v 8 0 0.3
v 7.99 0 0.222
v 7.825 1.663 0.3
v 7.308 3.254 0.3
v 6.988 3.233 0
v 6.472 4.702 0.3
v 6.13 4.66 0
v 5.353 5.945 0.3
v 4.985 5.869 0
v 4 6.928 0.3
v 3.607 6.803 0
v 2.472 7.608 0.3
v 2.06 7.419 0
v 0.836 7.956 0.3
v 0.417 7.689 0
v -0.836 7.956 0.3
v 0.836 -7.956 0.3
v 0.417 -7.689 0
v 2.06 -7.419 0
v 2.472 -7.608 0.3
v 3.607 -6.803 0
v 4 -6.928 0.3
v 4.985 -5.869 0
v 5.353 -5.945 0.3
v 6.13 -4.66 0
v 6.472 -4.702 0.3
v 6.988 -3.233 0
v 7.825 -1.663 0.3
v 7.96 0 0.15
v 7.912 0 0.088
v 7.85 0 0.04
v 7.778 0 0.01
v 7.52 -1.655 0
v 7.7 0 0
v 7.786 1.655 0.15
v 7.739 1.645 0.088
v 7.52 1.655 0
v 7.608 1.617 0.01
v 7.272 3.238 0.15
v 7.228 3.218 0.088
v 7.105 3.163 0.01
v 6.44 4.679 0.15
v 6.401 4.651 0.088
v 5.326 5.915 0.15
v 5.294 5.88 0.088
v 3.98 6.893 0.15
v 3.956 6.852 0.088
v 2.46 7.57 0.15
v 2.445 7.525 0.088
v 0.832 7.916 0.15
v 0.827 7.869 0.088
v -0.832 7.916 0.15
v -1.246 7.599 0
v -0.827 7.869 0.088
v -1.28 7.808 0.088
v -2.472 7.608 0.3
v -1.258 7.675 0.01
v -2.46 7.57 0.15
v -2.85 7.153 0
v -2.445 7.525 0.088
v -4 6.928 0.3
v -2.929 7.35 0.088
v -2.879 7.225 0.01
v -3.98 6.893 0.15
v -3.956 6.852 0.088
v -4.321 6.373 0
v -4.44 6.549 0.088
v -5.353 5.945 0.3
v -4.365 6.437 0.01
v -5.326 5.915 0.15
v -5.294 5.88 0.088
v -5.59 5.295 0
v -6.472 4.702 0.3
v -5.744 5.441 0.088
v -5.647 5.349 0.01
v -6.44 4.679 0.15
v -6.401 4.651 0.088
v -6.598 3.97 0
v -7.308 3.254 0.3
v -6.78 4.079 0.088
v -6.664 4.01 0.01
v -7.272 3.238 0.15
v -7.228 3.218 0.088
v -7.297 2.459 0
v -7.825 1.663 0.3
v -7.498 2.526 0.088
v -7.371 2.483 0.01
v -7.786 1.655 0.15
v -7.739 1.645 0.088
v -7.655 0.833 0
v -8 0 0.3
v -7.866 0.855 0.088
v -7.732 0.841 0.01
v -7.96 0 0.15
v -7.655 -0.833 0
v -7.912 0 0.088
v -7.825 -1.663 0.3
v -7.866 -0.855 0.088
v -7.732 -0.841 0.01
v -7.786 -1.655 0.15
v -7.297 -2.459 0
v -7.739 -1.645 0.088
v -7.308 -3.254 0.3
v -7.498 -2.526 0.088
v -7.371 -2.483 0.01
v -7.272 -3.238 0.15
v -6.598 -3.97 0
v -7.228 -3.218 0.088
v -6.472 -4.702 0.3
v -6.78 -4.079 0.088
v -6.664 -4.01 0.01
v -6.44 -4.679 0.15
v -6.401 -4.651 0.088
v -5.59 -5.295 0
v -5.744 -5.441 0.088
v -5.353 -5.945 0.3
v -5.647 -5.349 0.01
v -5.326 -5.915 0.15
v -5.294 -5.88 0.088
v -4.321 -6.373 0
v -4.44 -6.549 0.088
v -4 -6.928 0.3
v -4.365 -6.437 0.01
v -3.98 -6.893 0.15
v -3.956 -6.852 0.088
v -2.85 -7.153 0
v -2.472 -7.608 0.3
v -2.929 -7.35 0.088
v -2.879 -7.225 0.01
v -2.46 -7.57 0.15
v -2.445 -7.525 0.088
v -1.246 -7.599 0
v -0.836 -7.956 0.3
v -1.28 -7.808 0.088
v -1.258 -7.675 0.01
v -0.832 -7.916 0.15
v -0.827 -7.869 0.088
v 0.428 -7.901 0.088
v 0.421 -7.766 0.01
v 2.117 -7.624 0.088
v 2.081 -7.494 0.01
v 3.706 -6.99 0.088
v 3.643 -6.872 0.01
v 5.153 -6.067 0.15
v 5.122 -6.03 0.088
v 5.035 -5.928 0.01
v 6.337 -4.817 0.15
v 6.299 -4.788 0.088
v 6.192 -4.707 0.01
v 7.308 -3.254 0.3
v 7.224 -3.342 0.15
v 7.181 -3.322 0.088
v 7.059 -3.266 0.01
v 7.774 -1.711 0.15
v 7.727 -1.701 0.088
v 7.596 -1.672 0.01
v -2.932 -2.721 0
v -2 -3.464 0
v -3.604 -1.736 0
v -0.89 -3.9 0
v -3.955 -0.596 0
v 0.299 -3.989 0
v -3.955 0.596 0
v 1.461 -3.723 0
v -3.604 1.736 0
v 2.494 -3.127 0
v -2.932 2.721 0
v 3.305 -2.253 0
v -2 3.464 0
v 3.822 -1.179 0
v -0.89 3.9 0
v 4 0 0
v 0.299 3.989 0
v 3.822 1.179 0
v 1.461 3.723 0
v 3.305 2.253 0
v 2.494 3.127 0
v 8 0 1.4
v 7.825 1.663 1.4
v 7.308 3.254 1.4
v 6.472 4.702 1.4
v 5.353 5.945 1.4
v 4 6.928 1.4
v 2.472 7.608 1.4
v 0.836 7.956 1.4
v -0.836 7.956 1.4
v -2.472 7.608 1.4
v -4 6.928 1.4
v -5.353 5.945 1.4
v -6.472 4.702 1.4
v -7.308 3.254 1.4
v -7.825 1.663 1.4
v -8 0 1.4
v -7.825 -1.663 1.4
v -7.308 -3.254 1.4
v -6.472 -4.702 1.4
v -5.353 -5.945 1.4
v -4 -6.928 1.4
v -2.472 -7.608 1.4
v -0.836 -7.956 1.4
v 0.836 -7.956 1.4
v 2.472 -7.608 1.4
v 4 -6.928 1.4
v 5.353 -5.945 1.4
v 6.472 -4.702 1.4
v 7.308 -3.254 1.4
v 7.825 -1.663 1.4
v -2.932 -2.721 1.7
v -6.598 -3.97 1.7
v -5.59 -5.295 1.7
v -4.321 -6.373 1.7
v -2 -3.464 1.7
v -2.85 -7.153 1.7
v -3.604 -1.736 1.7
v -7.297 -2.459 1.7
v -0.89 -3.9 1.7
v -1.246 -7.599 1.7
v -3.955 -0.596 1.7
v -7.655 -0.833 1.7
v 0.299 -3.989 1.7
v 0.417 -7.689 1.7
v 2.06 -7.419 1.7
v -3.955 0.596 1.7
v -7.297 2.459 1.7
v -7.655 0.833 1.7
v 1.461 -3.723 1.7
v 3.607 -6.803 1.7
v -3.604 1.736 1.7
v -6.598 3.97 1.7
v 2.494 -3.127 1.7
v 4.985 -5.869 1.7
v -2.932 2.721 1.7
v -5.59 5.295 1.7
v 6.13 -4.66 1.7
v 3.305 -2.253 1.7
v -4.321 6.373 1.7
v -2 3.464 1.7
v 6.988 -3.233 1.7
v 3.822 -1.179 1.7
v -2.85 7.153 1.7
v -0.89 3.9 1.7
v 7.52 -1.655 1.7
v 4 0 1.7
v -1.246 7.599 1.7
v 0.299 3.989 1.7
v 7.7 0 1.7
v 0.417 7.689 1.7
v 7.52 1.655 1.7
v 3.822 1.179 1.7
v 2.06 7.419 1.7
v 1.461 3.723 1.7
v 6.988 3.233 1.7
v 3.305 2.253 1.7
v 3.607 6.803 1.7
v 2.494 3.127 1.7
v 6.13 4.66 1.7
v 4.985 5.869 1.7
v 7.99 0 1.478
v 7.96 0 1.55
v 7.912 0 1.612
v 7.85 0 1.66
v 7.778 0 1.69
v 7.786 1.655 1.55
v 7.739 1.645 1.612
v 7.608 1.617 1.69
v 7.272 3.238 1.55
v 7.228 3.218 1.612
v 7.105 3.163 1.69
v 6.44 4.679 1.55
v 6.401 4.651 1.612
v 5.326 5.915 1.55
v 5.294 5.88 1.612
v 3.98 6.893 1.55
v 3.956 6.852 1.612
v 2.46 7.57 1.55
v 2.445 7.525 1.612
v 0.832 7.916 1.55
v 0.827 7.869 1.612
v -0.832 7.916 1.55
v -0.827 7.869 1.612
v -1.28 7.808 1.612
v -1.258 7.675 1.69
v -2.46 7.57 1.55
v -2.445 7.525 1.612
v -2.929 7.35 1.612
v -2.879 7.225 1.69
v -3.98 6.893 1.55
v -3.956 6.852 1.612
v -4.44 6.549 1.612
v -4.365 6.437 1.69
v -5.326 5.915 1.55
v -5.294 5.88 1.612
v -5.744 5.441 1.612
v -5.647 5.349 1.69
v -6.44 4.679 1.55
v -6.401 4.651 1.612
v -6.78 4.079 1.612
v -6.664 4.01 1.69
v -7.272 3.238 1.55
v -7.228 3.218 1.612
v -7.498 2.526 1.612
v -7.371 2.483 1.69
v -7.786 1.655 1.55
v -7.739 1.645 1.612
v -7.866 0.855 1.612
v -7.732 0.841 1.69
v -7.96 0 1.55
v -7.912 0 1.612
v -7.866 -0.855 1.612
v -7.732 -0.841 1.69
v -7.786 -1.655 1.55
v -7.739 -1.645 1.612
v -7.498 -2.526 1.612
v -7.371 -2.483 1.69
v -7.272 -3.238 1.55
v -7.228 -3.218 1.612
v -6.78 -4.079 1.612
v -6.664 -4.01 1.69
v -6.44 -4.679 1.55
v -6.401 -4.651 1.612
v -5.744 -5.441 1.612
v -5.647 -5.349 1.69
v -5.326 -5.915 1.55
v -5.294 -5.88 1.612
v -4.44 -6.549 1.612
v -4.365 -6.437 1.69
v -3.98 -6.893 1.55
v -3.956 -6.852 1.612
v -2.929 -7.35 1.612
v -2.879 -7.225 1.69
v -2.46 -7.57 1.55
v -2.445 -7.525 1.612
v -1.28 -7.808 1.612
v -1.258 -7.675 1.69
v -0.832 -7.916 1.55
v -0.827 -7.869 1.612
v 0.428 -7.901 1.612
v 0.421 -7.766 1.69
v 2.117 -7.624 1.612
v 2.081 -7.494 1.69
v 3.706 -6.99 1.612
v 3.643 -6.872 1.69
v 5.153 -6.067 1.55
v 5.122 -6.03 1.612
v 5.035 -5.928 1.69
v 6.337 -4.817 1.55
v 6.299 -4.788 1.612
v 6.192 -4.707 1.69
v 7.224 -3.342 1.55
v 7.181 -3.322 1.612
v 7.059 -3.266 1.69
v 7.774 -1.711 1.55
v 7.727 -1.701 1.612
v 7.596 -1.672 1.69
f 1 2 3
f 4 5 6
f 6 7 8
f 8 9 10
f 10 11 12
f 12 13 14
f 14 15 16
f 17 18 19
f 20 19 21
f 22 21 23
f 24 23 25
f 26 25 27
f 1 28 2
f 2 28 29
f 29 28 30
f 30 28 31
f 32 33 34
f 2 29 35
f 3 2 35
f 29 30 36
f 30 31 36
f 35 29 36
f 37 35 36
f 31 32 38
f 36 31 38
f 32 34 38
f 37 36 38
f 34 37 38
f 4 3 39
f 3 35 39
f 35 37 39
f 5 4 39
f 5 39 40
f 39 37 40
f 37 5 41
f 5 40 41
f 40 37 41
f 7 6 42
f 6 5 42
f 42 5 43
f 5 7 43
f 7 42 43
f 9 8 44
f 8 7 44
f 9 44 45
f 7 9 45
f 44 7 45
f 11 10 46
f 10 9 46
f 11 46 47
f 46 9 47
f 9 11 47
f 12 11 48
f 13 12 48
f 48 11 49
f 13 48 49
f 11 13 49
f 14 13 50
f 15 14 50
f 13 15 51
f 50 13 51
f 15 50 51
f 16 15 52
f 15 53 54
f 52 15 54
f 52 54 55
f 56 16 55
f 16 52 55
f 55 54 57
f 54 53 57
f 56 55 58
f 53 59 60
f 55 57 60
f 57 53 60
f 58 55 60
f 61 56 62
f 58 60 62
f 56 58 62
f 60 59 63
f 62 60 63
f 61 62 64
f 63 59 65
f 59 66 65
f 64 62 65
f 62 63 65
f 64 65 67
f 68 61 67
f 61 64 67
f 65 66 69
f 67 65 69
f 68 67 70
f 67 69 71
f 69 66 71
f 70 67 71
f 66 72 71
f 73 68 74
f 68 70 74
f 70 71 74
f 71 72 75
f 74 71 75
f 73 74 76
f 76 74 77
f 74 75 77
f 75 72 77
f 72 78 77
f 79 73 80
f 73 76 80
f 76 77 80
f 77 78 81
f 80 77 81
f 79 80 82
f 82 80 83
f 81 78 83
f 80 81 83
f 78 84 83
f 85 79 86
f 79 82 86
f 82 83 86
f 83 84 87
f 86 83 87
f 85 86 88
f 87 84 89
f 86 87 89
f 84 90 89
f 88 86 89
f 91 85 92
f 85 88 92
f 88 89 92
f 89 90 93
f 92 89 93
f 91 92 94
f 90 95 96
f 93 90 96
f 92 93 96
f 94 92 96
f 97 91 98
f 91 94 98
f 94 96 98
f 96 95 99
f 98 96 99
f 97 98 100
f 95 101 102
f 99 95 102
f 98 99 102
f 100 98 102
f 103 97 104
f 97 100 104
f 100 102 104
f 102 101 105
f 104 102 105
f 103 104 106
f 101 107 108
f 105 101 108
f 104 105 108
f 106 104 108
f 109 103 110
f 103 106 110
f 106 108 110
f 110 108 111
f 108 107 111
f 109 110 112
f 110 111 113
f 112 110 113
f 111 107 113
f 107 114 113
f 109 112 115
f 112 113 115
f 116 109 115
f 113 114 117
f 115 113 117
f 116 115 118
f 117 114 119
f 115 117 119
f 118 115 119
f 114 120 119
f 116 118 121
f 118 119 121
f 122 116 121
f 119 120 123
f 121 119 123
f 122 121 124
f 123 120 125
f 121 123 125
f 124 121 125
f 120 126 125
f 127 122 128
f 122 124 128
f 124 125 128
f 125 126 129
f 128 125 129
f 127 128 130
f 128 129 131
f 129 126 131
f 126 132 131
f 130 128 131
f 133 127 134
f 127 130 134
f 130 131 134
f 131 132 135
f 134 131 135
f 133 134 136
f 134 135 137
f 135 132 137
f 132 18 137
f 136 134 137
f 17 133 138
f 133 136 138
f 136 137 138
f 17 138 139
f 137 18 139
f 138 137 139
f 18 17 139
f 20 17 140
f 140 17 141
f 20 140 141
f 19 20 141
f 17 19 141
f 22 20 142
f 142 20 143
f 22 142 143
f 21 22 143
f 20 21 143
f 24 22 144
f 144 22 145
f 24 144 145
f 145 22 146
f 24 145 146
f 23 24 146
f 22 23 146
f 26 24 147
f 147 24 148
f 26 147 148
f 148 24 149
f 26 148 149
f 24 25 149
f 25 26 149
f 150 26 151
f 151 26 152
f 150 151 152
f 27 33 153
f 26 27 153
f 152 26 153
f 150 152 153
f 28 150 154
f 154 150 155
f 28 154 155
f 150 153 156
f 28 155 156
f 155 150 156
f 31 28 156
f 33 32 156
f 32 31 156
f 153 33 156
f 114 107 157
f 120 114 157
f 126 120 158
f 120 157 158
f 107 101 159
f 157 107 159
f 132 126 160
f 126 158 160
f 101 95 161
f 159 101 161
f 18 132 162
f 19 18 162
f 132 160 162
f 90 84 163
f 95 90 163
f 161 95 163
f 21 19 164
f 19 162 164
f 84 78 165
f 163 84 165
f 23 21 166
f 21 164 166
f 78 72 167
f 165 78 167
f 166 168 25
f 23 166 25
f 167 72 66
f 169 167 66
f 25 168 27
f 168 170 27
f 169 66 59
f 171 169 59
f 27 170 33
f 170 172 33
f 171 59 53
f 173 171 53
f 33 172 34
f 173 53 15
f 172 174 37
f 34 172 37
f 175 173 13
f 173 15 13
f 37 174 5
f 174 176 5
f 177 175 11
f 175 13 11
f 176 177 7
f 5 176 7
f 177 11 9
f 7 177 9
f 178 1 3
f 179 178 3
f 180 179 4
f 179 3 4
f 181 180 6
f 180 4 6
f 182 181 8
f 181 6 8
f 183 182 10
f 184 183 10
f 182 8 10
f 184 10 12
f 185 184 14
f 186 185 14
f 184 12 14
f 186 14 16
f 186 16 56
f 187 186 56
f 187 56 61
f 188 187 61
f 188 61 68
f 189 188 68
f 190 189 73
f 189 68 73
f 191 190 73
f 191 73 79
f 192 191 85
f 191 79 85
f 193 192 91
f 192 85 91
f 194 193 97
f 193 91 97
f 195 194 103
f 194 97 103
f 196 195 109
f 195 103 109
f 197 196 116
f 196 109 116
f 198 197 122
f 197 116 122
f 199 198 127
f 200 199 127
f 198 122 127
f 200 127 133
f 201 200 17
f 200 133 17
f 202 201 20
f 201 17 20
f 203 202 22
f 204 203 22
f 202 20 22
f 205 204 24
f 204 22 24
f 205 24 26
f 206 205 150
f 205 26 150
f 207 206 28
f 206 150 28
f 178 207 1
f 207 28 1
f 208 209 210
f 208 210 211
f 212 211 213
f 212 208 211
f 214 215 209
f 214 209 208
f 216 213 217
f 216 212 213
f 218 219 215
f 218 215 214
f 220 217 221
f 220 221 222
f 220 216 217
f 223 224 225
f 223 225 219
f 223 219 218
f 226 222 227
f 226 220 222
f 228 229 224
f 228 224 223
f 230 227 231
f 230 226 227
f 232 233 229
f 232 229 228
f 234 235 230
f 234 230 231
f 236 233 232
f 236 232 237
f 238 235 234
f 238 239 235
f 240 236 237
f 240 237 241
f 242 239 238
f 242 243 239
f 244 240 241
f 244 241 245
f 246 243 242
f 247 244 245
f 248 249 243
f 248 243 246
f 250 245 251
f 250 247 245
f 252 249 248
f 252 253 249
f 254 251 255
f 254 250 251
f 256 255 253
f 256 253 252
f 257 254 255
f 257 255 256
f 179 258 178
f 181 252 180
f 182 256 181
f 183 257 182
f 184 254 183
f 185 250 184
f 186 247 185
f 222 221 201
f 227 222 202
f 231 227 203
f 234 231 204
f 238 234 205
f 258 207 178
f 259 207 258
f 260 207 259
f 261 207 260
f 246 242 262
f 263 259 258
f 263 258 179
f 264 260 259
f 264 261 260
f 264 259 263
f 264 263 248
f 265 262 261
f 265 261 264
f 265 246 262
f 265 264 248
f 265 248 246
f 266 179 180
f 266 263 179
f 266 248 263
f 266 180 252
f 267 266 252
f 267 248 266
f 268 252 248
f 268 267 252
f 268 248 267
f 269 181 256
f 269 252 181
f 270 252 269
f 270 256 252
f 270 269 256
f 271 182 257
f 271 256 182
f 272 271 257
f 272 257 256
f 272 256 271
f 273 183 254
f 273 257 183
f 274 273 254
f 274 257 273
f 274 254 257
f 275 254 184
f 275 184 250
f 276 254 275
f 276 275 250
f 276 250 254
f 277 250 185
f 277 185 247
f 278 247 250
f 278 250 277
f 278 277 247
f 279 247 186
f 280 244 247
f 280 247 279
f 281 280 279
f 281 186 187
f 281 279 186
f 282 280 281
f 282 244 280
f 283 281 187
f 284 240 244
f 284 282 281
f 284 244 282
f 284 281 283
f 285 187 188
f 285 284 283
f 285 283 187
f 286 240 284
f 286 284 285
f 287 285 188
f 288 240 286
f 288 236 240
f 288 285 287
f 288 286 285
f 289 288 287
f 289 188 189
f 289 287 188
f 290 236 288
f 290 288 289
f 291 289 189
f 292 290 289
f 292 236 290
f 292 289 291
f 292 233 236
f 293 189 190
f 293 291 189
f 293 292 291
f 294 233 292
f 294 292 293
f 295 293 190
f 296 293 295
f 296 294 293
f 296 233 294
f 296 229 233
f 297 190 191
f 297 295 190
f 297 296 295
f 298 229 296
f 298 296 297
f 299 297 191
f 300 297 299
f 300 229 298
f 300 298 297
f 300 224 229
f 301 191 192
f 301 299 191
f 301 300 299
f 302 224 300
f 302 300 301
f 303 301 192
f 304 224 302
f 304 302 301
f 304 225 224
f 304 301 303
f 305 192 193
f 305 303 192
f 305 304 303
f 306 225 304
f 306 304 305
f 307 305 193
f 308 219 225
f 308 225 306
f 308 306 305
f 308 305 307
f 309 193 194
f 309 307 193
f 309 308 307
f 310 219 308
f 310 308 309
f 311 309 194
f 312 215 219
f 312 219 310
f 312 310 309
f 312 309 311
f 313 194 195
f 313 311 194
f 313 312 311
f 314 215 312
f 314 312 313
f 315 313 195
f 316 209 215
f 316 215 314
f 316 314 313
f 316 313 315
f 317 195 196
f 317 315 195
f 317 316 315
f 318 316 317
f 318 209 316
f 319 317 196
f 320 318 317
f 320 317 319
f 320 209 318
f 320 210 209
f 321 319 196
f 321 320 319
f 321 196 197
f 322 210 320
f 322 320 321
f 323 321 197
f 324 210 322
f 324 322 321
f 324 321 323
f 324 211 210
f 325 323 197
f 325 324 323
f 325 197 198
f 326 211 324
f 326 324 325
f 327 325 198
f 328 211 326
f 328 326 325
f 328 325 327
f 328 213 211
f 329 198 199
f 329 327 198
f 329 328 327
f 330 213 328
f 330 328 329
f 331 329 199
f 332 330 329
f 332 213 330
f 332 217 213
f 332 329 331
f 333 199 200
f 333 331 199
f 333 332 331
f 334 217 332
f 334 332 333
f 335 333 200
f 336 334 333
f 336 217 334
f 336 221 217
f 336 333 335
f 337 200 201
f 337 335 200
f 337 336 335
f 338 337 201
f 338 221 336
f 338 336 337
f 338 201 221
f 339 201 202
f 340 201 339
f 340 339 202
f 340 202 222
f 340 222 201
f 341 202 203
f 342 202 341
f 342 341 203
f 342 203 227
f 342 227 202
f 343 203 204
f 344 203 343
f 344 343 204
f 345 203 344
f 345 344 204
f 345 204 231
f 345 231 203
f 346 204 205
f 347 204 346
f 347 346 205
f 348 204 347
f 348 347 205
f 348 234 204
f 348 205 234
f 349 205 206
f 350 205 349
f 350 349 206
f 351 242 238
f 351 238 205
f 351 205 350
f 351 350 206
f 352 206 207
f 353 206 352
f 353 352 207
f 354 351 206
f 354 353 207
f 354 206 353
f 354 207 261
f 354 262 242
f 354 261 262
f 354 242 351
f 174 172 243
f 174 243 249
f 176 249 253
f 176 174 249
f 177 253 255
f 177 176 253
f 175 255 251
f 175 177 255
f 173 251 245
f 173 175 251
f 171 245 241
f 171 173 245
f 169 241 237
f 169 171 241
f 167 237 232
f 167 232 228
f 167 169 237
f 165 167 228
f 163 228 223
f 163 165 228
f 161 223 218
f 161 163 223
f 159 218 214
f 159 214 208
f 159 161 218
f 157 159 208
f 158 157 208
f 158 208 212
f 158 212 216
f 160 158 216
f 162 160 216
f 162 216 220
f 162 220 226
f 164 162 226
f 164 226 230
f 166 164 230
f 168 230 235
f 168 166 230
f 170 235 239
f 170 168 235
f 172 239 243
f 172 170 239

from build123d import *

# Parameters (mm, degrees)
CYLINDER001_R     = 4
CYLINDER001_DEPTH = 1.7
CYLINDER_R        = 8
CYLINDER_DEPTH    = 1.7
FILLET_R          = 0.3


with BuildPart() as cilindroint:
    # Cylinder001 → Cylinder001 (new body)
    with BuildSketch(Plane.XY):
        Circle(CYLINDER001_R)
    extrude(amount=CYLINDER001_DEPTH)


with BuildPart() as rondana516:
    # Cylinder → Cylinder (new body)
    with BuildSketch(Plane.XY):
        Circle(CYLINDER_R)
    extrude(amount=CYLINDER_DEPTH)

    # Cut: cut cilindroInt
    add(cilindroint.part, mode=Mode.SUBTRACT)

    # Fillet
    fillet_edges = [rondana516.edges().sort_by_distance(p)[0] for p in [
        (-8, 0, 1.7),
        (-8, 0, 0),
    ]]
    fillet(fillet_edges, radius=FILLET_R)


solid = rondana516.part
